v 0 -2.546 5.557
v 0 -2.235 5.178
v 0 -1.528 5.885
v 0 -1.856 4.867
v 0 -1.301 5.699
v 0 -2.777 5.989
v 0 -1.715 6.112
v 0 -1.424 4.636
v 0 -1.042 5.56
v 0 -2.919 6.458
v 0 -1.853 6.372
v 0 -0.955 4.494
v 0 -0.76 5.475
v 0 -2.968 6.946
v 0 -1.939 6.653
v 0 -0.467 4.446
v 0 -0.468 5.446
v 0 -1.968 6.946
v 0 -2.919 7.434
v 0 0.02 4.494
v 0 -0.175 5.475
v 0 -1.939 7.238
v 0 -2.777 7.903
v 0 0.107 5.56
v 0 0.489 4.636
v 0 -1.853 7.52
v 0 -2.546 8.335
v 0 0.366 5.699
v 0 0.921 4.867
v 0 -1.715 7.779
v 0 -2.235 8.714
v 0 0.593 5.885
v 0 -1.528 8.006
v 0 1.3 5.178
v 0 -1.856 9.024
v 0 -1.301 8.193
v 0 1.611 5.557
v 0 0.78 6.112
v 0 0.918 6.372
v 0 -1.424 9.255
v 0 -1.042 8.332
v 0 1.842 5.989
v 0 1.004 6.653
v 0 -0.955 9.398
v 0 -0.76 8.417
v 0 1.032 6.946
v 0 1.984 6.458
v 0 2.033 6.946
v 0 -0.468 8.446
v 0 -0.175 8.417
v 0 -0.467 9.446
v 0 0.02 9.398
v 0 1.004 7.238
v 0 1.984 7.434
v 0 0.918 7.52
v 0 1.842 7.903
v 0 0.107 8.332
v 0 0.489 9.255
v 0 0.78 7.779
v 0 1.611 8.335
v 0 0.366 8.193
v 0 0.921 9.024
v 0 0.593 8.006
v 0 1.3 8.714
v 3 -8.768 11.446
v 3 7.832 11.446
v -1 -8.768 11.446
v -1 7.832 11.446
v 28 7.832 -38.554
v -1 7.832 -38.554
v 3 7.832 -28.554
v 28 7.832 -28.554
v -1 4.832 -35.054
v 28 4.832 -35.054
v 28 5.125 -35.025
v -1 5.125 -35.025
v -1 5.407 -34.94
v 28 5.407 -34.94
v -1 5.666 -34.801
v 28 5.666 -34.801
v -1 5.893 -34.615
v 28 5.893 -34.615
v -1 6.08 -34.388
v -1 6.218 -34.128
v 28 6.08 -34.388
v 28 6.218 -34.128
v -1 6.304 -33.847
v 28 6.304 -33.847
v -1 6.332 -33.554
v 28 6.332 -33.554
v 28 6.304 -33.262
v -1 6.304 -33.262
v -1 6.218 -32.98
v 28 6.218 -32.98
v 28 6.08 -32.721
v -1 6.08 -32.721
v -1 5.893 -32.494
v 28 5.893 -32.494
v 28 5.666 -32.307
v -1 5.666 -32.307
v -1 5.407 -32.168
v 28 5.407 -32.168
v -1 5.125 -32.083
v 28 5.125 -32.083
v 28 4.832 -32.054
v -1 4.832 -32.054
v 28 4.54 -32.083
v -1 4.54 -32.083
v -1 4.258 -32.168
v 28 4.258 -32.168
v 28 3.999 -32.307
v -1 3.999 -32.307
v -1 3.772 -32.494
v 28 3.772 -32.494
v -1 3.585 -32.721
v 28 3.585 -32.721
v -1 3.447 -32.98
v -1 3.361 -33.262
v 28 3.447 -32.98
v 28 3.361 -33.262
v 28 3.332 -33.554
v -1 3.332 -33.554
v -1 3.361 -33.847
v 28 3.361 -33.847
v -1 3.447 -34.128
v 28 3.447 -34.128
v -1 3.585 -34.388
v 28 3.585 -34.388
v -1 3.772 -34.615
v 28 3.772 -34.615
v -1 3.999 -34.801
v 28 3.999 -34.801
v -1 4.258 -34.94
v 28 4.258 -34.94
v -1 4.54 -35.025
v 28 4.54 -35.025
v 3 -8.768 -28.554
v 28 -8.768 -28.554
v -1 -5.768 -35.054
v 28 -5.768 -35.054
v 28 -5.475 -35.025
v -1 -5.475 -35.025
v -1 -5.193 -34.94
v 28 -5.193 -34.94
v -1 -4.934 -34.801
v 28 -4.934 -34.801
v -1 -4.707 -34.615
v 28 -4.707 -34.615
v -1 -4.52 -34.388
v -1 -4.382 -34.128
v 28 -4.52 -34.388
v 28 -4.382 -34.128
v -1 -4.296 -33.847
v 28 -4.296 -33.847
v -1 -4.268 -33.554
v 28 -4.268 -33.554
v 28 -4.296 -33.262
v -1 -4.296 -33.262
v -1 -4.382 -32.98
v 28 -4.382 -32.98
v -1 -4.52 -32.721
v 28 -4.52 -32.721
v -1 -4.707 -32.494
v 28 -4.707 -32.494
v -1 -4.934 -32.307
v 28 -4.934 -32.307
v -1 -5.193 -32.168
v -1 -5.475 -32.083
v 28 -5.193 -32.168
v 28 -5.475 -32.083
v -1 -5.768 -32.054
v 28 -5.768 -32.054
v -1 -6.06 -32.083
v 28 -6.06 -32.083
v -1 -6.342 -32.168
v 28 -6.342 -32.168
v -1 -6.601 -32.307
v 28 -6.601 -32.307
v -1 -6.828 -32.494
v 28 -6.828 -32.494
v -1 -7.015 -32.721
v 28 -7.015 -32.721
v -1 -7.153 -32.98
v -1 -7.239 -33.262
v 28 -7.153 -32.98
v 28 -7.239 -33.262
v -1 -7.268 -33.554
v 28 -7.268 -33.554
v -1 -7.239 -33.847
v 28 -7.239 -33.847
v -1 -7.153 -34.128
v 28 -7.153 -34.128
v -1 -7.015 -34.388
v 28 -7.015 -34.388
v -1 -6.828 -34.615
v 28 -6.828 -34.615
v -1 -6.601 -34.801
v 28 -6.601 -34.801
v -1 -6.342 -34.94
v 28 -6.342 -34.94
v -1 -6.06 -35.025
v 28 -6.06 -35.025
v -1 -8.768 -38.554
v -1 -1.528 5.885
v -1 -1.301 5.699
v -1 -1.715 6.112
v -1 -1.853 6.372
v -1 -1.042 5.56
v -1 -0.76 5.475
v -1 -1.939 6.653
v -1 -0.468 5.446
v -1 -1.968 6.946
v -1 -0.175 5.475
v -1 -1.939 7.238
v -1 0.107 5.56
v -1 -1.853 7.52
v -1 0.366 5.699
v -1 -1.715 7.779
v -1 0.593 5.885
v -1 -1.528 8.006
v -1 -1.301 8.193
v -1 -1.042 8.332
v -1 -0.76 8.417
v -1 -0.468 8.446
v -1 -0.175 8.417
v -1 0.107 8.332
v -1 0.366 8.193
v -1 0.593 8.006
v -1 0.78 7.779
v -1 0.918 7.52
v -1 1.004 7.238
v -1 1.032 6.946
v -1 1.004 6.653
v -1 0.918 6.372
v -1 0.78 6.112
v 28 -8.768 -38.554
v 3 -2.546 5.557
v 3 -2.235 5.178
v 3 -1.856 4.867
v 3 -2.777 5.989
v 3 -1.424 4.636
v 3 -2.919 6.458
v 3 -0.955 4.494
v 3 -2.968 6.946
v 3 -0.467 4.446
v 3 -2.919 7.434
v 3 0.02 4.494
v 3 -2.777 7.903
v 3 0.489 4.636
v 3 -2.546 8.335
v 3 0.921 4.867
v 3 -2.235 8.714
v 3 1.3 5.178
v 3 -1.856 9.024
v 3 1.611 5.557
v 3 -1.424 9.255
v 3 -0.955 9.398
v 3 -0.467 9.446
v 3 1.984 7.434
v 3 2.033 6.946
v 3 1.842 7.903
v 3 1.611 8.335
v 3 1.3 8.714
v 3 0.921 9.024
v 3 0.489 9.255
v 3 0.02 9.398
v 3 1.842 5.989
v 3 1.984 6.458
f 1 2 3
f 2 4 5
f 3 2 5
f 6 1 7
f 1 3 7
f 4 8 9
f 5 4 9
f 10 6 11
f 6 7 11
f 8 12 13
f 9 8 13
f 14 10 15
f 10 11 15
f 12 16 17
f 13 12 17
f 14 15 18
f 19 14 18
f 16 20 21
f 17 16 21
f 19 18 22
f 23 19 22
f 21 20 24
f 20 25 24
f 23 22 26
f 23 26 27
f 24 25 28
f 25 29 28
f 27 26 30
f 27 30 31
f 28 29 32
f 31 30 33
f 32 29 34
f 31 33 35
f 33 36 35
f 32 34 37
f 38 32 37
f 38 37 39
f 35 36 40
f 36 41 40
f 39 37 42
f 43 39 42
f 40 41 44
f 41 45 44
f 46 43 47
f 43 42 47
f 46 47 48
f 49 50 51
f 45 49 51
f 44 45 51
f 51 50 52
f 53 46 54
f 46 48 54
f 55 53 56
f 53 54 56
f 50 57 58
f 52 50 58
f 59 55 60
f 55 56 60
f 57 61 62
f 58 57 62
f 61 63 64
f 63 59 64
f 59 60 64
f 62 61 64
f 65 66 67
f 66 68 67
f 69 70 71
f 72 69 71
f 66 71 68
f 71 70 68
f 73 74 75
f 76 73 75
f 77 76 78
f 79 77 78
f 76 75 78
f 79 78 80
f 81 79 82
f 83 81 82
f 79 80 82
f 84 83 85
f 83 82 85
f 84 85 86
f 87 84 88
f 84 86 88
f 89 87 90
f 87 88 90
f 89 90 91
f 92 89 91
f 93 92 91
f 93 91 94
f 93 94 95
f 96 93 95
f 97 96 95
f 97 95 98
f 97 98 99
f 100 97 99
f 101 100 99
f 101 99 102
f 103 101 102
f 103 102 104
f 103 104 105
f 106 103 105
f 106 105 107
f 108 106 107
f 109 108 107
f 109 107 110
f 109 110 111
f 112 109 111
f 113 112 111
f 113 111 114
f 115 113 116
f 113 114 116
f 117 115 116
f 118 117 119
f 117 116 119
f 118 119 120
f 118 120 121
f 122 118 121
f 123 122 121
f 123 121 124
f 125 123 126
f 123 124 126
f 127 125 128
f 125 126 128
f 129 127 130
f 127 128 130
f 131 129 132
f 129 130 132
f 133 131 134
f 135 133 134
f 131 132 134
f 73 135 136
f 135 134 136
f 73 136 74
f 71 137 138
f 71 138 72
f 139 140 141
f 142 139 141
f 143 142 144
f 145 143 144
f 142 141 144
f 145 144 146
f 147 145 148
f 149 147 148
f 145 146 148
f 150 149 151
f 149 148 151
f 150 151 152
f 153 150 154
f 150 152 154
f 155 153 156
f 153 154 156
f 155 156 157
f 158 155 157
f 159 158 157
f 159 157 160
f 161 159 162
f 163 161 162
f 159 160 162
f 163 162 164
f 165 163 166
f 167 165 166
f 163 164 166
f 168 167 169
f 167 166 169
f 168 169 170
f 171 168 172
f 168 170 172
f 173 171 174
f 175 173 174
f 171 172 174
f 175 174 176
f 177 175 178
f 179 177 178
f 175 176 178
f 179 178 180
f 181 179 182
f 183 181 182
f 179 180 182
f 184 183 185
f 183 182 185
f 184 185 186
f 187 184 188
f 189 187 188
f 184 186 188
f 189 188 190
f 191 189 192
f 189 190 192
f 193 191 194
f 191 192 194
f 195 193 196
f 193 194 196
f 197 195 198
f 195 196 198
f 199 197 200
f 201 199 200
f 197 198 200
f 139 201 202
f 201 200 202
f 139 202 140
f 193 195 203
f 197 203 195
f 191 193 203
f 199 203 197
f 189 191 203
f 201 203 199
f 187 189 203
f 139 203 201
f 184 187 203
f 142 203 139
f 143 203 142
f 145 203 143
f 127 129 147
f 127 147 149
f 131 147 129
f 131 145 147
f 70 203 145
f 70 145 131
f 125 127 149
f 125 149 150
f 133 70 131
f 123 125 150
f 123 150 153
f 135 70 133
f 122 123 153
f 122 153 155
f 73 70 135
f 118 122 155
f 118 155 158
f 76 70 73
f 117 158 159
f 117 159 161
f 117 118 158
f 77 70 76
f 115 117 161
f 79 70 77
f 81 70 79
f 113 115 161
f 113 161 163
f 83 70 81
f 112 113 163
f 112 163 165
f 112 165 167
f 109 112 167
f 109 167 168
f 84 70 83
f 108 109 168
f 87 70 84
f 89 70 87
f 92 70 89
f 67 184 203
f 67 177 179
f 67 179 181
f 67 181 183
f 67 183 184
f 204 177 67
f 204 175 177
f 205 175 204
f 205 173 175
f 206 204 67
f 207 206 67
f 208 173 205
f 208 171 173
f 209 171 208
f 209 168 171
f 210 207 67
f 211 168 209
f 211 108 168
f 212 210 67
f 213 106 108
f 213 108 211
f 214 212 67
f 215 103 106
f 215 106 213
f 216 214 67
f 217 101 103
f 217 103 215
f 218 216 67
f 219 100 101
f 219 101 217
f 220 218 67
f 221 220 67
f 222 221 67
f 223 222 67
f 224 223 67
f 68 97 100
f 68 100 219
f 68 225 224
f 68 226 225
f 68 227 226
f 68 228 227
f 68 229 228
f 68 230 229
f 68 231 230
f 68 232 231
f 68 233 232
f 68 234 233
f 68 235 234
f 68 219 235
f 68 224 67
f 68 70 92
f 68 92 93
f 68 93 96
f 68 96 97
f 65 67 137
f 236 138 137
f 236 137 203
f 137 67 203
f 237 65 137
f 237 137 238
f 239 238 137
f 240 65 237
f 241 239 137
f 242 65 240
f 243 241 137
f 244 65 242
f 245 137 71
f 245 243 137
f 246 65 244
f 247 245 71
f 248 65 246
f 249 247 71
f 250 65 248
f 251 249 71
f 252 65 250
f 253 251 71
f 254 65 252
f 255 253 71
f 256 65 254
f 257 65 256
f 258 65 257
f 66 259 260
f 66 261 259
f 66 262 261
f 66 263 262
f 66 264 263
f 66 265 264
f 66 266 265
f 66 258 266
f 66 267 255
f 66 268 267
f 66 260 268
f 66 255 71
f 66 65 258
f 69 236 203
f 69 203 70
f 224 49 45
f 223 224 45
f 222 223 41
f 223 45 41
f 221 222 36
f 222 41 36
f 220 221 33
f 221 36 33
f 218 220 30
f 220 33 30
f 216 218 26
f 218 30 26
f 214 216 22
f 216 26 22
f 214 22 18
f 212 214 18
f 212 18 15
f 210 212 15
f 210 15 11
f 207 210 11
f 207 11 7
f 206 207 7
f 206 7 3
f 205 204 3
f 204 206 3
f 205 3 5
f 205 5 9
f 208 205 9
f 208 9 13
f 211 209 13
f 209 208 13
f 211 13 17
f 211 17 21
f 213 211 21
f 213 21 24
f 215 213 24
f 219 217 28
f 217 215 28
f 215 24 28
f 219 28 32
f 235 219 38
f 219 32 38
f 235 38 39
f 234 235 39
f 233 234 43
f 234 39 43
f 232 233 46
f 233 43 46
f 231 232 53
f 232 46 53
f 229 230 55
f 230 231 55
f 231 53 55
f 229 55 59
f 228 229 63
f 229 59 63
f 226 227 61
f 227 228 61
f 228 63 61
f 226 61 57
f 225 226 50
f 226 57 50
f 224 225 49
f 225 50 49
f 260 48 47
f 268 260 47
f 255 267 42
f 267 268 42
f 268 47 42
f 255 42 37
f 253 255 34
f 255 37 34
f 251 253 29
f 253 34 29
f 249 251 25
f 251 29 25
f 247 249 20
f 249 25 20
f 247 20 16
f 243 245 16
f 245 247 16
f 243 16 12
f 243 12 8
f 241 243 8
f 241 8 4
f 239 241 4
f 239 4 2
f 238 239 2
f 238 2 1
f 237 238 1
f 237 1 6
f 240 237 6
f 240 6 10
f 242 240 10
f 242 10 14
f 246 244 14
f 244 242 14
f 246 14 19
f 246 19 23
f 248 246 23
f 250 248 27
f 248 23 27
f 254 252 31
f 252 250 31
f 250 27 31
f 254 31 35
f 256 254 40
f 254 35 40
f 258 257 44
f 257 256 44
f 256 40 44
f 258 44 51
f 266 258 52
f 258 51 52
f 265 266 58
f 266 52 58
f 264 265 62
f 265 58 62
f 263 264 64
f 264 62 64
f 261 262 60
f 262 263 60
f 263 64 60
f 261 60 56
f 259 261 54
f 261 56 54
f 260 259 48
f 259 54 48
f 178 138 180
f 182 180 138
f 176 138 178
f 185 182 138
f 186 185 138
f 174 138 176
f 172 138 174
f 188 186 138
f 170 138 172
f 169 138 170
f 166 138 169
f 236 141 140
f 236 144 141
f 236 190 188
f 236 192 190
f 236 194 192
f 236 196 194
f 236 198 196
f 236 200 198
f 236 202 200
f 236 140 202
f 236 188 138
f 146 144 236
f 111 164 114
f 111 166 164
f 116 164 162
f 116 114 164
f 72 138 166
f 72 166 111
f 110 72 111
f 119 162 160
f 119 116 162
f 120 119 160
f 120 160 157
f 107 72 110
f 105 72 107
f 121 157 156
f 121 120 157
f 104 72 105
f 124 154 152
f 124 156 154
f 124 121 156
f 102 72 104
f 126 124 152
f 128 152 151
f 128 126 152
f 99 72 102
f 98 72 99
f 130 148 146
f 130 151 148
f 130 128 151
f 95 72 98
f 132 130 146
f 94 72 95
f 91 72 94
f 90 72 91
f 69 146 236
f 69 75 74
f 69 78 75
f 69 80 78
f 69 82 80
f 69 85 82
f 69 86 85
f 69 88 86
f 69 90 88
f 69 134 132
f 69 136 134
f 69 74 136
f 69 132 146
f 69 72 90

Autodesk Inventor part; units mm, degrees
ref_plane "YZ Plane" through (0, 0, 0) normal (1, 0, 0) x (0, 1, 0)
ref_plane "XZ Plane" through (0, 0, 0) normal (0, 1, 0) x (-1, 0, 0)
ref_plane "XY Plane" through (0, 0, 0) normal (0, 0, 1) x (1, 0, 0)
sketch "スケッチ1" plane through (0, 0, 0) normal (1, 0, 0) x (0, 1, 0)
  line L0 (7.8325, 11.4458) -> (-8.7675, 11.4458)
  line L1 (-8.7675, 11.4458) -> (-8.7675, -38.5542)
  line L2 (-8.7675, -38.5542) -> (7.8325, -38.5542)
  line L3 (7.8325, -38.5542) -> (7.8325, 11.4458)
  circle A0 centre (-0.4675, 6.9458) radius 2.5
  line L4 (7.8325, 11.4458) -> (-8.7675, 11.4458)
  line L5 (-8.7675, 11.4458) -> (-8.7675, -38.5542)
  line L6 (-8.7675, -38.5542) -> (7.8325, -38.5542)
  line L7 (7.8325, -38.5542) -> (7.8325, 11.4458)
  circle A1 centre (-0.4675, 6.9458) radius 2.5
  point P0 (0, 0)
  point P1 (0, 0)
  point P2 (0, 0)
  dimension "d0" = 16.6
  dimension "d1" = 5
  dimension "d2" = 8.3
  dimension "d3" = 8.3
  dimension "d4" = 4.5
  dimension "d5" = 2
  dimension "d6" = 50
  dimension "d7" = 16.6
  dimension "d8" = 5
  dimension "d9" = 8.3
  dimension "d10" = 8.3
  dimension "d11" = 4.5
  dimension "d12" = 2
  dimension "d13" = 50
extrude "押し出し1" add sketch "スケッチ1" along normal blind 3
sketch "スケッチ2" plane through (3, 0, 0) normal (1, 0, 0) x (0, 0, -1)
  line L0 (-11.4458, -8.7675) -> (38.5542, -8.7675) projected
  line L1 (38.5542, 7.8325) -> (-11.4458, 7.8325) projected
  line L2 (38.5542, -8.7675) -> (28.5542, -8.7675)
  line L3 (28.5542, -8.7675) -> (28.5542, 7.8325)
  line L4 (28.5542, 7.8325) -> (38.5542, 7.8325)
  line L5 (38.5542, 7.8325) -> (38.5542, -8.7675)
  point P0 (0, 0)
  dimension "d16" = 10
extrude "押し出し2" add sketch "スケッチ2" along normal blind 25
sketch "スケッチ3" plane through (0, 0, 0) normal (-1, 0, 0) x (0, 0, 1)
  line L0 (-28.5542, 7.8325) -> (11.4458, 7.8325) projected
  line L1 (-38.5542, -8.7675) -> (-38.5542, 7.8325) projected
  line L2 (11.4458, 7.8325) -> (-38.5542, 7.8325)
  line L3 (-38.5542, 7.8325) -> (-38.5542, -8.7675)
  line L4 (-38.5542, -8.7675) -> (11.4458, -8.7675)
  line L5 (11.4458, -8.7675) -> (11.4458, 7.8325)
  circle A0 centre (6.9458, -0.4675) radius 2.5 projected
  circle A1 centre (6.9458, -0.4675) radius 1.5
  point P0 (0, 0)
  dimension "d19" = 3
extrude "押し出し3" add sketch "スケッチ3" along normal blind 1 contours L0 L5 L4 L1 L2 | A0
sketch "スケッチ4" plane through (28, 0, 0) normal (1, 0, 0) x (0, 0, -1)
  circle A0 centre (33.5542, -5.7675) radius 1.5
  circle A1 centre (33.5542, 4.8325) radius 1.5
  line L0 (28.5542, -8.7675) -> (38.5542, -8.7675) projected
  line L1 (38.5542, 7.8325) -> (28.5542, 7.8325) projected
  line L2 (28.5542, 7.8325) -> (28.5542, -8.7675) projected
  point P0 (0, 0)
  dimension "d22" = 3
  dimension "d23" = 3
  dimension "d24" = 3
  dimension "d25" = 3
  dimension "d26" = 5
  dimension "d27" = 5
extrude "押し出し4" cut sketch "スケッチ4" against normal blind 100
properties part number "armpart4"
